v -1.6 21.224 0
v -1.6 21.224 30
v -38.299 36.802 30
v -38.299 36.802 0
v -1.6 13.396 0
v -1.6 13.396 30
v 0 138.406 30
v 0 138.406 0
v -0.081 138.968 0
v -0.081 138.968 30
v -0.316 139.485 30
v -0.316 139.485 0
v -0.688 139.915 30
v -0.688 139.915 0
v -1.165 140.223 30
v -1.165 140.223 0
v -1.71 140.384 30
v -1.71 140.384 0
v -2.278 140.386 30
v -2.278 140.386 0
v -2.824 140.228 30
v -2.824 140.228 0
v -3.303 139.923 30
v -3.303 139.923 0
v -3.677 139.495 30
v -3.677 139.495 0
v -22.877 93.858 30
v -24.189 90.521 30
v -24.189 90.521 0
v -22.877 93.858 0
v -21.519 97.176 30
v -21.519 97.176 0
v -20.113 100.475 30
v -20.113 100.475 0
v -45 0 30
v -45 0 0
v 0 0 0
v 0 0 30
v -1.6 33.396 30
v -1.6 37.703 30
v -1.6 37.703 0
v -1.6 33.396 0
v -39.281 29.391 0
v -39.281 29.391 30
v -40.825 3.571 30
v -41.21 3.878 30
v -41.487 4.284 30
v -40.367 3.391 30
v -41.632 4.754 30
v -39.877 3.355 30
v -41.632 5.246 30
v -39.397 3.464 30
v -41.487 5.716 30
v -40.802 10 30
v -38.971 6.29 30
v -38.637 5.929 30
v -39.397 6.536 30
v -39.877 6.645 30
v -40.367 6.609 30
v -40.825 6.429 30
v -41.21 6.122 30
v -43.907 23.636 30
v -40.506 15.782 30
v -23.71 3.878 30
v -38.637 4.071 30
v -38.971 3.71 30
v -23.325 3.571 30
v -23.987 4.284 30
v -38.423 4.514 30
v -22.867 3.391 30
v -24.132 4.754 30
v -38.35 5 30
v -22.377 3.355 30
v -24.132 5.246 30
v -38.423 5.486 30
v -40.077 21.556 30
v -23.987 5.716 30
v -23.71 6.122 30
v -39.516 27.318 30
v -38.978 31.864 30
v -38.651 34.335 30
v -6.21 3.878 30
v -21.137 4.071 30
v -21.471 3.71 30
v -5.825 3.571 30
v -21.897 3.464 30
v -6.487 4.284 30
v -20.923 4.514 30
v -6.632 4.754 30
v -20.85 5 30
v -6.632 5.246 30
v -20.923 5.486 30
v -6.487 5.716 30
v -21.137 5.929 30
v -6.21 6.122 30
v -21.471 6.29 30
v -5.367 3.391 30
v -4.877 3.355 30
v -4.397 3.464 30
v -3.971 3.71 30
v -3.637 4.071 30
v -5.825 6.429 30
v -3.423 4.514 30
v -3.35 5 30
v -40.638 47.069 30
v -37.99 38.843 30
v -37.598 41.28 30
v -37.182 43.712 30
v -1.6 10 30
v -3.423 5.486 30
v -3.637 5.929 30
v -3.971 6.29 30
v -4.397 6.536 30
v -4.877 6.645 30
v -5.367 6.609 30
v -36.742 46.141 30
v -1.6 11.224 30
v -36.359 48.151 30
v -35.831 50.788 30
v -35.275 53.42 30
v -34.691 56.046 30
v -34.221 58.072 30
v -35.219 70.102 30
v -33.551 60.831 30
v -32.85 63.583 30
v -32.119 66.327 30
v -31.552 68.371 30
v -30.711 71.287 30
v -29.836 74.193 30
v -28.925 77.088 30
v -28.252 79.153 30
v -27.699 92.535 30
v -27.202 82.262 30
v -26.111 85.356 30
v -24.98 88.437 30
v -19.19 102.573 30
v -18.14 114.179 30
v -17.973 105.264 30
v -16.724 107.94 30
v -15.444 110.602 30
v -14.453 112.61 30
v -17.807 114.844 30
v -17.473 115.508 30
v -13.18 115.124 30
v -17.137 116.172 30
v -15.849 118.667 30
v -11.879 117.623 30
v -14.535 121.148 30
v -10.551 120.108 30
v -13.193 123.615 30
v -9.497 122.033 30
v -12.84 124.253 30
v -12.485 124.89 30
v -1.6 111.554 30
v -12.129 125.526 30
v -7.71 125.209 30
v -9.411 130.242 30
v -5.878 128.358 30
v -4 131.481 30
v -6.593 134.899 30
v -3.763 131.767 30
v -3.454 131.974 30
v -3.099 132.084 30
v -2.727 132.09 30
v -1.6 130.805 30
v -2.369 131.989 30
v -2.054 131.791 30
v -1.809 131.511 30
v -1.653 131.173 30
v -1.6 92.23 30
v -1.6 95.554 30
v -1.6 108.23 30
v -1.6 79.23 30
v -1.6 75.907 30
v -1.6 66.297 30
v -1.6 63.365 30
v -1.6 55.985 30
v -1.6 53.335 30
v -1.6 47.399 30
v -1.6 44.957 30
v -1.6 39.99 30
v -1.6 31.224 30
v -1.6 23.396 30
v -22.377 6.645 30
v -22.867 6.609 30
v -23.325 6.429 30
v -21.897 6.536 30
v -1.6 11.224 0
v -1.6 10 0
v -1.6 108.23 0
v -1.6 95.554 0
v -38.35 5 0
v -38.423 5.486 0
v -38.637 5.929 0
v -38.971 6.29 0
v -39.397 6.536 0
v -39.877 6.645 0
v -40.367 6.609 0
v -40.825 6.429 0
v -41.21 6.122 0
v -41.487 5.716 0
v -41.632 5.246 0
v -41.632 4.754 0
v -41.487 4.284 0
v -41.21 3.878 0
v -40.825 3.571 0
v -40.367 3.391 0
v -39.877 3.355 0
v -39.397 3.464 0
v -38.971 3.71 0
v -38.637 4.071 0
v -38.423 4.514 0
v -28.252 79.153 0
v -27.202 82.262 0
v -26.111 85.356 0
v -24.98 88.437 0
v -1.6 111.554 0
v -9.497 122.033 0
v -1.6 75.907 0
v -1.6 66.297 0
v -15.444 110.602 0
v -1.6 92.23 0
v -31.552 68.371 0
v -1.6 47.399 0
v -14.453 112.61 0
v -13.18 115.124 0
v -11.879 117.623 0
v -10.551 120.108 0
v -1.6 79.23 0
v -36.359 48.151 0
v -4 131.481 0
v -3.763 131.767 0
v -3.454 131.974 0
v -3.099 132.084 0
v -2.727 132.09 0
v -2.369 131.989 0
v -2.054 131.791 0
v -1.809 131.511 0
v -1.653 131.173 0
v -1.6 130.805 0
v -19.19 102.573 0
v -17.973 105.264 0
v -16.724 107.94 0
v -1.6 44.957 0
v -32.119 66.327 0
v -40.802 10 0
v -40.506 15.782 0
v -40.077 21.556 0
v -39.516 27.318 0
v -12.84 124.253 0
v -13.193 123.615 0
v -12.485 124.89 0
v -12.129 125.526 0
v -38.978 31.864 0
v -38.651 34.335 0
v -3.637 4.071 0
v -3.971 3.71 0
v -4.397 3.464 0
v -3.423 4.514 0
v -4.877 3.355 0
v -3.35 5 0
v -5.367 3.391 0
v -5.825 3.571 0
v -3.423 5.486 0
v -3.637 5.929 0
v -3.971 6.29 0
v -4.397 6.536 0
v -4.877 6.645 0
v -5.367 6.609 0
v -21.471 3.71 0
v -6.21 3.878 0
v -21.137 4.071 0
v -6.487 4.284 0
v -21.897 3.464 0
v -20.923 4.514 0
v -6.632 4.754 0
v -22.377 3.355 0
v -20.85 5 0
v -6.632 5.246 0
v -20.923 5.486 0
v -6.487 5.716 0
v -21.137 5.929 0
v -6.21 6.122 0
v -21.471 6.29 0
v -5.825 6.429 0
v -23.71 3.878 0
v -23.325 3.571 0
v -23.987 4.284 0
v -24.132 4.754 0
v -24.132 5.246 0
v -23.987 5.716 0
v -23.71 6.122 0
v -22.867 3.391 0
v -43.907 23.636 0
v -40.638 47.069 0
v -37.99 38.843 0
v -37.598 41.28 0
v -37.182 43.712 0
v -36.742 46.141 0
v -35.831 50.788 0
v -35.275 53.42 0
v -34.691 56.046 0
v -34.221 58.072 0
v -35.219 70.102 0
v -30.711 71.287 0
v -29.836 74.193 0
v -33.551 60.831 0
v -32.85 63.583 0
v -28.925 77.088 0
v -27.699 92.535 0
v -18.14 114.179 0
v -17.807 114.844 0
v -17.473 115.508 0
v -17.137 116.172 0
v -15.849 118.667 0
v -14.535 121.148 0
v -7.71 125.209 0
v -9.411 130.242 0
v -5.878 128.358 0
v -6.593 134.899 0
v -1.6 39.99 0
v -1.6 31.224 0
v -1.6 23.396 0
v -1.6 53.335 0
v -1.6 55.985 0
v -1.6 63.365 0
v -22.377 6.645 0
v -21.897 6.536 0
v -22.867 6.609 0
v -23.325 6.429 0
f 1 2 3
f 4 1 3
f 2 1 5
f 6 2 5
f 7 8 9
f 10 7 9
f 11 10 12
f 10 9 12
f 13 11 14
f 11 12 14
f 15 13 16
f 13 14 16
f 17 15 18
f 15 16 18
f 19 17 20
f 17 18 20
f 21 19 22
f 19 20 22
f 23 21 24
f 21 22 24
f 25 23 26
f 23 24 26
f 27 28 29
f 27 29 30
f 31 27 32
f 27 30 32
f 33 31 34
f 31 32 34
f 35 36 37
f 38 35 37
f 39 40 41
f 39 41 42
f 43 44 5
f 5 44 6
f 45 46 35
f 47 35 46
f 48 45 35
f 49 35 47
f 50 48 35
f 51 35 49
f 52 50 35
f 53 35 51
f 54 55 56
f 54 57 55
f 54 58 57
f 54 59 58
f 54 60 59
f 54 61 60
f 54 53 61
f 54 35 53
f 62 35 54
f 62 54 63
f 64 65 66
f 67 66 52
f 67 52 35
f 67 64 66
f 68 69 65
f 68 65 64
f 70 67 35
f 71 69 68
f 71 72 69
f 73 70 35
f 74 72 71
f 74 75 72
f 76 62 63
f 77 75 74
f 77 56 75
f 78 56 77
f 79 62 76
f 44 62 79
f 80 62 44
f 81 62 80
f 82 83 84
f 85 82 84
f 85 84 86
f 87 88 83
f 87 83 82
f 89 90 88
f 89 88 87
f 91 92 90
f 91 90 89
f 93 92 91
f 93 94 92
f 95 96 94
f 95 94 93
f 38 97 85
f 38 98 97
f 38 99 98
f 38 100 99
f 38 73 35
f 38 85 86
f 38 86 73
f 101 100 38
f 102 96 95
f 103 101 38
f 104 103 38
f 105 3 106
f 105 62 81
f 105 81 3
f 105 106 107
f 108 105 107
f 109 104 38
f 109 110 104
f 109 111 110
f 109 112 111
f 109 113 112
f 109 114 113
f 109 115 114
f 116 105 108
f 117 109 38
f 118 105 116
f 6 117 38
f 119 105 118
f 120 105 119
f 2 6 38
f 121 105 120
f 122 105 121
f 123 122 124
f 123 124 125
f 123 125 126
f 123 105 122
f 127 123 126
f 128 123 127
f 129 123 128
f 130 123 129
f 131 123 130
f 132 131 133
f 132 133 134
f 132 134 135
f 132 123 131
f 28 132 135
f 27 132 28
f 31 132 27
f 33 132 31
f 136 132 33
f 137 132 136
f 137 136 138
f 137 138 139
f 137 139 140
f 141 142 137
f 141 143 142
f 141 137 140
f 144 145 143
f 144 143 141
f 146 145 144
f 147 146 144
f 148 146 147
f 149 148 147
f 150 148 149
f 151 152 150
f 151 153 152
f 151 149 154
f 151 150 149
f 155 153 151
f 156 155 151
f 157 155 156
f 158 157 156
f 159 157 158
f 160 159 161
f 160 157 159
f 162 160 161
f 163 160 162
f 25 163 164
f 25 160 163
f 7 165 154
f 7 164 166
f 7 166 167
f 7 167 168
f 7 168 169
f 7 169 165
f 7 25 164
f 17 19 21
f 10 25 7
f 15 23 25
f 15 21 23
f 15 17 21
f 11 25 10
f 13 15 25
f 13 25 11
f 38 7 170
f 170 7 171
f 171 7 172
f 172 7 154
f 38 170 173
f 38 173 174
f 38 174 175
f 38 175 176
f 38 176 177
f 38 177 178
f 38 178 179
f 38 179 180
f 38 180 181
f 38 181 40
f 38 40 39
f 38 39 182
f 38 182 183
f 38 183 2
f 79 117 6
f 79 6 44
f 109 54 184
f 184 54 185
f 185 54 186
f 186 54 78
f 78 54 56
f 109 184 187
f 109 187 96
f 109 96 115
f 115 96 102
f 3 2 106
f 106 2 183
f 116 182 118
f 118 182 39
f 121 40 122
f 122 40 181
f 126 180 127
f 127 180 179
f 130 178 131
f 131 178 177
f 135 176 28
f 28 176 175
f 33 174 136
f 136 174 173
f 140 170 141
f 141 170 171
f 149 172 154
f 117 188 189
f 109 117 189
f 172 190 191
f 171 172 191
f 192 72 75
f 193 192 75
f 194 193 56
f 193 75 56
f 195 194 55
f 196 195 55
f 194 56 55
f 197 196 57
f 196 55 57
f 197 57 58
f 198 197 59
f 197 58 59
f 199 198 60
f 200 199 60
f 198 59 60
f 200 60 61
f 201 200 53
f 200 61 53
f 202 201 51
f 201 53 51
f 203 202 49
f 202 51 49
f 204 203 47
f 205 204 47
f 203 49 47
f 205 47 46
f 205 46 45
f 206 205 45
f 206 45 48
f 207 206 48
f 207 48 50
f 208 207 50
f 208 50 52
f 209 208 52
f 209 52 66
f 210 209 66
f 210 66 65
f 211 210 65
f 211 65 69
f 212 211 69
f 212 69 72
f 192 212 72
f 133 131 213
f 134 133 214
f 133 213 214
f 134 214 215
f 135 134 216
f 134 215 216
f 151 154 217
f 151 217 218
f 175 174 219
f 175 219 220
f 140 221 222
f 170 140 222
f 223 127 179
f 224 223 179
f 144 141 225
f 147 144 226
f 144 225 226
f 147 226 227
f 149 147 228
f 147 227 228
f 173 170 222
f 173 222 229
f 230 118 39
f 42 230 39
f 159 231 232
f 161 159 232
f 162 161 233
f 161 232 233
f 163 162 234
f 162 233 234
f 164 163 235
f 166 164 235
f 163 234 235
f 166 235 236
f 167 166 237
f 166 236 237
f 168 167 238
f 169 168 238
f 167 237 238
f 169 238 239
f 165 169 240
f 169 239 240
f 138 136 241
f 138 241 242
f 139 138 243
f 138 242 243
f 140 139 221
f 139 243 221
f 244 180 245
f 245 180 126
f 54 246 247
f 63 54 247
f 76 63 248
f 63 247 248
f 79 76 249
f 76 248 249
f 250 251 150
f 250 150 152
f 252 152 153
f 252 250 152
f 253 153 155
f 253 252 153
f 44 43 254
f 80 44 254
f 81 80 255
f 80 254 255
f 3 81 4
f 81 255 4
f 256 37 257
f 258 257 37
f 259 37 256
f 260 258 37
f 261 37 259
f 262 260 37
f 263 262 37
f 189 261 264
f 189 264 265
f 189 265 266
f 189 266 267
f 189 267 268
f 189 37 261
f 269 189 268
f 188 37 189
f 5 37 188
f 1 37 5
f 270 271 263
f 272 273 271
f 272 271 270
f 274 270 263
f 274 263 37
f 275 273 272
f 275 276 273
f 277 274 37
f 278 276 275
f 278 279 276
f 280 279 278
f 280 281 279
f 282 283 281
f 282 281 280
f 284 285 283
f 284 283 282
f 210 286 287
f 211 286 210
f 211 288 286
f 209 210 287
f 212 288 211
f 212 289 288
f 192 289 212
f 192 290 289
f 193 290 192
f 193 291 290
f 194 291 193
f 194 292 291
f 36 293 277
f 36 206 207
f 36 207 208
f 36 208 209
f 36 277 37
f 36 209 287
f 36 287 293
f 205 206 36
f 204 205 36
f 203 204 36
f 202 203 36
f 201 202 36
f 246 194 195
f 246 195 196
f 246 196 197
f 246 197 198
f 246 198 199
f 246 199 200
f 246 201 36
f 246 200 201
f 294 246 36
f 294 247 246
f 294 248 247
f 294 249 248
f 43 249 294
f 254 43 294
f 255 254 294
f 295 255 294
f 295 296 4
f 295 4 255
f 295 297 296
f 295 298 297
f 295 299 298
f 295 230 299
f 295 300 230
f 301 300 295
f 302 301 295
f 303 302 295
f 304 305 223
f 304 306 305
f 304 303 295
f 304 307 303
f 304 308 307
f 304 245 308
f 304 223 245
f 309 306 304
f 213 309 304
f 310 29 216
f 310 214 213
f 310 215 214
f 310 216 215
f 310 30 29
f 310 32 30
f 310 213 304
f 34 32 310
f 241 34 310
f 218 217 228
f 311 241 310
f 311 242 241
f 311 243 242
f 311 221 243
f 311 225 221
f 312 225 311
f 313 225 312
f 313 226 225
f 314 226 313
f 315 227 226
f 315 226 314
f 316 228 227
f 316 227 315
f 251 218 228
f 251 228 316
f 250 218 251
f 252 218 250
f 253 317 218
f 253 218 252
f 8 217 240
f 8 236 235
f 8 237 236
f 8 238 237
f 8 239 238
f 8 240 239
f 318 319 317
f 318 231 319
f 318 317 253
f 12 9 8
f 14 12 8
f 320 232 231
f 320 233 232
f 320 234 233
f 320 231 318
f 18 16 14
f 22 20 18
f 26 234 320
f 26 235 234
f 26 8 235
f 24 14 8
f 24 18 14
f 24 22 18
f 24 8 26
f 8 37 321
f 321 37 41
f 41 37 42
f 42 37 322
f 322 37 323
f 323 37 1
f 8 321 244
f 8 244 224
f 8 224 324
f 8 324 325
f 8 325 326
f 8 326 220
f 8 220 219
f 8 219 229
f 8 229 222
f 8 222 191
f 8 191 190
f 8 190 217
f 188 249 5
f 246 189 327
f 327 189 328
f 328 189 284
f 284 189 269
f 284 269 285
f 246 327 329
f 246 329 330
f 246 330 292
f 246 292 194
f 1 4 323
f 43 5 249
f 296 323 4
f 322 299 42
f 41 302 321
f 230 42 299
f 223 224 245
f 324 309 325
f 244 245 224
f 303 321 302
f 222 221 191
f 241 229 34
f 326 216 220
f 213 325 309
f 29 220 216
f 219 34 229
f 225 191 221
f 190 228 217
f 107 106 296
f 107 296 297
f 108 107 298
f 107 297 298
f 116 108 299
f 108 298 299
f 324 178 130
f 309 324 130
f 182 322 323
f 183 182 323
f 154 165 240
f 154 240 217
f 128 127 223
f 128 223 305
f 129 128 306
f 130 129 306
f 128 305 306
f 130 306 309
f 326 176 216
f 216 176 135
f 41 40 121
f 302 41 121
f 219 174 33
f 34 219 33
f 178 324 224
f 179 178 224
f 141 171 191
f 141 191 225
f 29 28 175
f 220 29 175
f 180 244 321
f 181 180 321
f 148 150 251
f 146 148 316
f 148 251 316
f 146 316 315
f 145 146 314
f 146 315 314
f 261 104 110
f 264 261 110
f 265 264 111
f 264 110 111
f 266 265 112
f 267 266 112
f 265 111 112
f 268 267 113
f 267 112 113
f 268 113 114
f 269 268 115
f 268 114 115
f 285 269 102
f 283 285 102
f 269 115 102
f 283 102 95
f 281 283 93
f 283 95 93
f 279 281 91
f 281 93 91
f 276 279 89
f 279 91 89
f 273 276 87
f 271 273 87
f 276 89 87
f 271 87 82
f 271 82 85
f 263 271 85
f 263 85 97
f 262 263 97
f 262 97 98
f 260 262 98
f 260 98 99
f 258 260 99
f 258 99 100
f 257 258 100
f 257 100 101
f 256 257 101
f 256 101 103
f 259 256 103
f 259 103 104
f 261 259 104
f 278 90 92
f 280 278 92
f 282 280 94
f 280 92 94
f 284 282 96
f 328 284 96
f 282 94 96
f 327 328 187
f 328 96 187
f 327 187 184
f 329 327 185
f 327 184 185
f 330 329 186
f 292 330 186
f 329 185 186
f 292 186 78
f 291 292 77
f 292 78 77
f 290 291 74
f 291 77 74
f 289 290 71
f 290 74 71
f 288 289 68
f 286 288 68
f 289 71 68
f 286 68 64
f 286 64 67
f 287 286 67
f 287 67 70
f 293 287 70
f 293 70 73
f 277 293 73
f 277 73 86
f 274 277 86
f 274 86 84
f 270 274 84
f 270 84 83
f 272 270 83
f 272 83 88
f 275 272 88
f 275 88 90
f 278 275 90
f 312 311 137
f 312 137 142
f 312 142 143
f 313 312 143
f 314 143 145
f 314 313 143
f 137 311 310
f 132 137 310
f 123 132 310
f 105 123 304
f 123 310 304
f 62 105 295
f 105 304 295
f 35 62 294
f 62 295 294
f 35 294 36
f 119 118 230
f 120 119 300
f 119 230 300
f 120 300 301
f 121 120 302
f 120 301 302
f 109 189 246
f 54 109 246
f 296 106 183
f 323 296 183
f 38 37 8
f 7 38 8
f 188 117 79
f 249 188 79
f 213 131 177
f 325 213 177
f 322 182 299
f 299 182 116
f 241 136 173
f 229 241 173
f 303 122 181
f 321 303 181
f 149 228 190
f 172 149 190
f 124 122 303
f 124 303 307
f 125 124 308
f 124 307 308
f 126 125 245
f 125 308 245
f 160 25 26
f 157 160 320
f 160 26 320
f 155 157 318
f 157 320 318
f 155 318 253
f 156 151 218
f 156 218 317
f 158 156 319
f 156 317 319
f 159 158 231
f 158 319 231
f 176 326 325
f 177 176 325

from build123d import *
from build123d.topology import SkipClean

# Parameters (mm, degrees)
BOSS_EXTRUDE4_DEPTH = 30
SKETCH12_R          = 1.65
CUT_EXTRUDE1_DEPTH  = 151.461734423
CUT_EXTRUDE2_START  = -20
CUT_EXTRUDE2_DEPTH  = 20
CUT_EXTRUDE3_START  = -30
CUT_EXTRUDE3_DEPTH  = 30
BOSS_EXTRUDE5_DEPTH = 30
CIRPATTERN1_COUNT   = 6
CIRPATTERN1_ANGLE   = 30
LPATTERN2_COUNT     = 3
LPATTERN2_PITCH     = 10
CUT_EXTRUDE4_START  = -30
CUT_EXTRUDE4_DEPTH  = 30
BOSS_EXTRUDE7_DEPTH = 30
LPATTERN3_COUNT     = 2
LPATTERN3_PITCH     = 16
CUT_EXTRUDE5_START  = -30
CUT_EXTRUDE5_DEPTH  = 30


with BuildPart() as part:
    # Sketch5 → Boss-Extrude4 (new body)
    with BuildSketch(Plane.XY):
        with BuildLine():
            Line((0, 0), (0, 138.405603612))
            ThreePointArc((0, 138.405603612), (-1.431938837, 140.323234054), (-3.677306515, 139.494934991))
            ThreePointArc((-3.677306515, 139.494934991), (-34.45212059, 72.743387818), (-45, 0))
            Line((-45, 0), (0, 0))
        make_face()
        with BuildLine():
            Line((-1.6, 10), (-40.801596678, 10))
            ThreePointArc((-40.801596678, 10), (-30.171322984, 73.09445494), (-4, 131.480881584))
            ThreePointArc((-4, 131.480881584), (-2.54422163, 132.052107892), (-1.6, 130.805498221))
            Line((-1.6, 130.805498221), (-1.6, 10))
        make_face(mode=Mode.SUBTRACT)
    extrude(amount=BOSS_EXTRUDE4_DEPTH)

    # Sketch12 → Cut-Extrude1 (cut, through all)
    with BuildSketch(Plane.XY.offset(30)):
        with Locations((-40, 5)):
            Circle(SKETCH12_R)
        with Locations((-22.5, 5)):
            Circle(SKETCH12_R)
        with Locations((-5, 5)):
            Circle(SKETCH12_R)
    extrude(amount=-CUT_EXTRUDE1_DEPTH, mode=Mode.SUBTRACT)

    # Sketch17 → Cut-Extrude2 (cut)
    with BuildSketch(Plane.XY.offset(30).offset(CUT_EXTRUDE2_START)):
        Polygon((-109.129206393, -31.174044695), (890.870793607, -18.386269912), (884.13367644, 508.454191469), (-120.638203698, 868.825955305), (-717.462714608, 272.001444394), align=None)
        with BuildLine():
            Line((-45, 0), (0, 0))
            Line((0, 0), (0, 138.405603612))
            ThreePointArc((0, 138.405603612), (-0.890765175, 140.069814567), (-2.769598102, 140.25160436))
            ThreePointArc((-2.769598102, 140.25160436), (-57.041683198, 80.109492203), (-45, 0))
        make_face(mode=Mode.SUBTRACT)
    extrude(amount=CUT_EXTRUDE2_DEPTH, mode=Mode.SUBTRACT)

    # Sketch18 → Cut-Extrude3 (cut)
    with BuildSketch(Plane.XY.offset(30).offset(CUT_EXTRUDE3_START)):
        Polygon((10.567687301, -7.152622061), (26.572035637, 318.782087337), (-234.729728554, 306.471050155), (-205.798791176, -46.855716973), align=None)
        with BuildLine():
            Line((-45, 0), (0, 0))
            Line((0, 0), (0, 138.405603612))
            ThreePointArc((0, 138.405603612), (-1.431938837, 140.323234054), (-3.677306515, 139.494934991))
            ThreePointArc((-3.677306515, 139.494934991), (-34.45212059, 72.743387818), (-45, 0))
        make_face(mode=Mode.SUBTRACT)
    extrude(amount=CUT_EXTRUDE3_DEPTH, mode=Mode.SUBTRACT)

    # Sketch14 → Boss-Extrude5 (add)
    with BuildSketch(Plane.XY.offset(30)):
        Polygon((48.4, 10), (-108.88130356, 76.761952422), (-108.099841303, 78.602962129), (49.181462257, 11.841009707), align=None)
    boss_extrude5 = extrude(amount=-BOSS_EXTRUDE5_DEPTH)

    # CirPattern1: Boss-Extrude5 ×6 about axis
    cirpattern1_axis = Axis((49.181462257, 11.841009707, 0), (0, 0, -1))
    for i in range(1, CIRPATTERN1_COUNT):
        add(boss_extrude5.rotate(cirpattern1_axis, i * CIRPATTERN1_ANGLE / (CIRPATTERN1_COUNT - 1)))

    # LPattern2: Boss-Extrude5 ×3
    with Locations(*[(0, -i * LPATTERN2_PITCH, 0) for i in range(1, LPATTERN2_COUNT)]):
        add(boss_extrude5)

    # Sketch20 → Cut-Extrude4 (cut)
    with BuildSketch(Plane.XY.offset(30).offset(CUT_EXTRUDE4_START)):
        Polygon((77.475806055, -29.017161833), (-265.551297842, 6.523481062), (-137.36538358, 367.52057294), (154.147754773, 113.145409747), align=None)
        with BuildLine():
            Line((-45, 0), (0, 0))
            Line((0, 0), (0, 138.405603612))
            ThreePointArc((0, 138.405603612), (-1.431938837, 140.323234054), (-3.677306515, 139.494934991))
            ThreePointArc((-3.677306515, 139.494934991), (-34.45212059, 72.743387818), (-45, 0))
        make_face(mode=Mode.SUBTRACT)
    extrude(amount=CUT_EXTRUDE4_DEPTH, mode=Mode.SUBTRACT)

    # Sketch21 → Boss-Extrude7 (add)
    with BuildSketch(Plane.XY.offset(30)):
        Polygon((-1.6, 92.230286229), (-0.00272898, 93.433916276), (-24.075329906, 125.379336678), (-25.672600926, 124.175706631), align=None)
    boss_extrude7 = extrude(amount=-BOSS_EXTRUDE7_DEPTH)

    # LPattern3: Boss-Extrude7 ×2
    with Locations(*[(0, i * LPATTERN3_PITCH, 0) for i in range(1, LPATTERN3_COUNT)]):
        add(boss_extrude7)

    # Sketch22 → Cut-Extrude5 (cut)
    with SkipClean():  # the faces are left unmerged after this step: merging them gives an invalid solid
        with BuildSketch(Plane.XY.offset(30).offset(CUT_EXTRUDE5_START)):
            Polygon((-56.498976092, -6.715699617), (29.926379711, -13.421115154), (17.260594809, 198.668694776), (-109.397254213, 188.734745833), align=None)
            with BuildLine():
                Line((0, 138.405603612), (0, 0))
                Line((0, 0), (-45, 0))
                ThreePointArc((-45, 0), (-34.45212059, 72.743387818), (-3.677306515, 139.494934991))
                ThreePointArc((-3.677306515, 139.494934991), (-1.431938837, 140.323234054), (0, 138.405603612))
            make_face(mode=Mode.SUBTRACT)
        extrude(amount=CUT_EXTRUDE5_DEPTH, mode=Mode.SUBTRACT)


solid = part.part
